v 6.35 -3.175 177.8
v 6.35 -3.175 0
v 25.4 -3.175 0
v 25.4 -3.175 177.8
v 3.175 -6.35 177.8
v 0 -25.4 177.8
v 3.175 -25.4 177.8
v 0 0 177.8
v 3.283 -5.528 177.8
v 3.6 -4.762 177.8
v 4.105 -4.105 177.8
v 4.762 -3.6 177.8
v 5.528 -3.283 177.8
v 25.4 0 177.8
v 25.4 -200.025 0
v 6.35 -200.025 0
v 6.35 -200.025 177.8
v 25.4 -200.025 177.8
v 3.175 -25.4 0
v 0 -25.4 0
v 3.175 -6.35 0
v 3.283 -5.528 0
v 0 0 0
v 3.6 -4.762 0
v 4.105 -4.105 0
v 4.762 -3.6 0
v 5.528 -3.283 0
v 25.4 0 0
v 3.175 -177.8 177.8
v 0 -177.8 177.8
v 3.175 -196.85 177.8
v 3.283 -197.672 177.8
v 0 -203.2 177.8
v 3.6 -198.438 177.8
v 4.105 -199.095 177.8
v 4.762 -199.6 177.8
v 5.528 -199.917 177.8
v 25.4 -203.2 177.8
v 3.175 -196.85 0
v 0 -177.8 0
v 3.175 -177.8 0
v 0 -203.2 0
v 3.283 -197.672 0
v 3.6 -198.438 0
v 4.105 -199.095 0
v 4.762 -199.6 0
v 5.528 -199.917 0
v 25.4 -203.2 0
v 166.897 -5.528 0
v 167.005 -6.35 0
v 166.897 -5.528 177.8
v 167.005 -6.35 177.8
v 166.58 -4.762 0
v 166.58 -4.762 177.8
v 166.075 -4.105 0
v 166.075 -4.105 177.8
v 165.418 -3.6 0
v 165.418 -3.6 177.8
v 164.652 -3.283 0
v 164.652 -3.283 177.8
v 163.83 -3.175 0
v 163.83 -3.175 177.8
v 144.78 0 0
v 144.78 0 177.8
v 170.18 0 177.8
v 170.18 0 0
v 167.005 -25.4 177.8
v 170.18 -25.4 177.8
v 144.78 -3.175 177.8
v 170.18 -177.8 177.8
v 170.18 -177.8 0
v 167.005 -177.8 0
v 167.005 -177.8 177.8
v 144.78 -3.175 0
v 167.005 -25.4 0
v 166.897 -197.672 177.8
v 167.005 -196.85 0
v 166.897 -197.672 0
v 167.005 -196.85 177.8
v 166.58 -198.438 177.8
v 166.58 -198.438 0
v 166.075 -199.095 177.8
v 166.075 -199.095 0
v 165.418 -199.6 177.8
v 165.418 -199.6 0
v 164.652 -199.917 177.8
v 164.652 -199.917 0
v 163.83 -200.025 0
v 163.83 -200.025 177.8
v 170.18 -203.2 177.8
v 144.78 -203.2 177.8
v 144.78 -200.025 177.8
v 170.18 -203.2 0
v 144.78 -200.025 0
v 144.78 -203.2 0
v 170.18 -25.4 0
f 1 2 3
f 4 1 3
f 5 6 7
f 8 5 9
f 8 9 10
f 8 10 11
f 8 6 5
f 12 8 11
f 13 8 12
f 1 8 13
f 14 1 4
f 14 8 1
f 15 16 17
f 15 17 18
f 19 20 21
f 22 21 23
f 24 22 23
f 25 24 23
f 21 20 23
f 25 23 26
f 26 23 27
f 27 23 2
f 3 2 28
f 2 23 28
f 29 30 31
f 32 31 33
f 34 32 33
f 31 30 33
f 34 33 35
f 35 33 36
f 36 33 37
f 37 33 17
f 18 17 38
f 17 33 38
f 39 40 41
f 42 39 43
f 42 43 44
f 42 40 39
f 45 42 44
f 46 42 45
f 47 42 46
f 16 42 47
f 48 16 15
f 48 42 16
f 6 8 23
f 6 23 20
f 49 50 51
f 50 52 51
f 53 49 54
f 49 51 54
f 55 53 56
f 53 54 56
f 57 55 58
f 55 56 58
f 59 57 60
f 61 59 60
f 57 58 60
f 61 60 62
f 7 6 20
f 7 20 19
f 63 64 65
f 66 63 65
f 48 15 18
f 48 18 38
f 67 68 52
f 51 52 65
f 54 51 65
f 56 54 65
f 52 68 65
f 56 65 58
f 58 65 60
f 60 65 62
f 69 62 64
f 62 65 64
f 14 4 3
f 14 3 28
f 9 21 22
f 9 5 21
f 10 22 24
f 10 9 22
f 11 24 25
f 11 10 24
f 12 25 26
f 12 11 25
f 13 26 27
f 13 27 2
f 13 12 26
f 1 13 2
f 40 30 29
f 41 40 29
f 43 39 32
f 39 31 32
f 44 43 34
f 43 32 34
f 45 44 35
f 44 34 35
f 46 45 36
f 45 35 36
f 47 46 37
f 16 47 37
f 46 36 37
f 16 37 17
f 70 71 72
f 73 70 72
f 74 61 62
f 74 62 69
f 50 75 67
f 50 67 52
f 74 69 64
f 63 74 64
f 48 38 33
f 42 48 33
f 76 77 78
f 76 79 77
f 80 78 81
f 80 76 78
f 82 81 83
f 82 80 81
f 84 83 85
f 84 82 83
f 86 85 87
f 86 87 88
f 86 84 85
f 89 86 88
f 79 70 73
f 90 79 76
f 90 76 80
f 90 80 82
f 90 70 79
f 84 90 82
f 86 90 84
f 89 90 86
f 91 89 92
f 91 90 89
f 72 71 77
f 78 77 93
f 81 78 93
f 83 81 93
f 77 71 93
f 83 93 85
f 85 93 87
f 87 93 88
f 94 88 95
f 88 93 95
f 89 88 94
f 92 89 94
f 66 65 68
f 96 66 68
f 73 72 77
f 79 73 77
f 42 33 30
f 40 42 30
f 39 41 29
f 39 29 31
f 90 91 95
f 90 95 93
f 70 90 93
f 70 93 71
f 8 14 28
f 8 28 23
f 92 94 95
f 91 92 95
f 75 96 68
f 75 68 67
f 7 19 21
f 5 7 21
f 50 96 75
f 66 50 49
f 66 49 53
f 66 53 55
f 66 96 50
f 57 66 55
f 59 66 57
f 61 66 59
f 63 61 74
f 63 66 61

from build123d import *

# Parameters (mm, degrees)
F1_DEPTH = 177.8
F4_R     = 3.175


# Not quite as in the source:
# - a length typed as a fraction of an inch, garbled in the dataset ("3 / 203.2 mm" for 3/8 in), is restored


with BuildPart() as f1:
    # F0 (on Top) → F1 (new body)
    with BuildSketch(Plane.XY):
        Polygon((25.4, 0), (0, 0), (0, -25.4), (3.175, -25.4), (3.175, -3.175), (25.4, -3.175), align=None)
    extrude(amount=F1_DEPTH)

    # F4
    f4_edges = [f1.edges().sort_by_distance(p)[0] for p in [
        (3.175, -3.175, 88.9),
    ]]
    fillet(f4_edges, radius=F4_R)


with BuildPart() as f5_1:
    # F5: instance of F1
    add(f1.part.mirror(Plane.XZ.offset(101.6)))


with BuildPart() as f6_1:
    # F6: instance of F1
    add(f1.part.mirror(Plane.YZ.offset(85.09)))


with BuildPart() as f6_2:
    # F6: instance of F5_1
    add(f5_1.part.mirror(Plane.YZ.offset(85.09)))


solid = Compound([f1.part, f5_1.part, f6_1.part, f6_2.part])
